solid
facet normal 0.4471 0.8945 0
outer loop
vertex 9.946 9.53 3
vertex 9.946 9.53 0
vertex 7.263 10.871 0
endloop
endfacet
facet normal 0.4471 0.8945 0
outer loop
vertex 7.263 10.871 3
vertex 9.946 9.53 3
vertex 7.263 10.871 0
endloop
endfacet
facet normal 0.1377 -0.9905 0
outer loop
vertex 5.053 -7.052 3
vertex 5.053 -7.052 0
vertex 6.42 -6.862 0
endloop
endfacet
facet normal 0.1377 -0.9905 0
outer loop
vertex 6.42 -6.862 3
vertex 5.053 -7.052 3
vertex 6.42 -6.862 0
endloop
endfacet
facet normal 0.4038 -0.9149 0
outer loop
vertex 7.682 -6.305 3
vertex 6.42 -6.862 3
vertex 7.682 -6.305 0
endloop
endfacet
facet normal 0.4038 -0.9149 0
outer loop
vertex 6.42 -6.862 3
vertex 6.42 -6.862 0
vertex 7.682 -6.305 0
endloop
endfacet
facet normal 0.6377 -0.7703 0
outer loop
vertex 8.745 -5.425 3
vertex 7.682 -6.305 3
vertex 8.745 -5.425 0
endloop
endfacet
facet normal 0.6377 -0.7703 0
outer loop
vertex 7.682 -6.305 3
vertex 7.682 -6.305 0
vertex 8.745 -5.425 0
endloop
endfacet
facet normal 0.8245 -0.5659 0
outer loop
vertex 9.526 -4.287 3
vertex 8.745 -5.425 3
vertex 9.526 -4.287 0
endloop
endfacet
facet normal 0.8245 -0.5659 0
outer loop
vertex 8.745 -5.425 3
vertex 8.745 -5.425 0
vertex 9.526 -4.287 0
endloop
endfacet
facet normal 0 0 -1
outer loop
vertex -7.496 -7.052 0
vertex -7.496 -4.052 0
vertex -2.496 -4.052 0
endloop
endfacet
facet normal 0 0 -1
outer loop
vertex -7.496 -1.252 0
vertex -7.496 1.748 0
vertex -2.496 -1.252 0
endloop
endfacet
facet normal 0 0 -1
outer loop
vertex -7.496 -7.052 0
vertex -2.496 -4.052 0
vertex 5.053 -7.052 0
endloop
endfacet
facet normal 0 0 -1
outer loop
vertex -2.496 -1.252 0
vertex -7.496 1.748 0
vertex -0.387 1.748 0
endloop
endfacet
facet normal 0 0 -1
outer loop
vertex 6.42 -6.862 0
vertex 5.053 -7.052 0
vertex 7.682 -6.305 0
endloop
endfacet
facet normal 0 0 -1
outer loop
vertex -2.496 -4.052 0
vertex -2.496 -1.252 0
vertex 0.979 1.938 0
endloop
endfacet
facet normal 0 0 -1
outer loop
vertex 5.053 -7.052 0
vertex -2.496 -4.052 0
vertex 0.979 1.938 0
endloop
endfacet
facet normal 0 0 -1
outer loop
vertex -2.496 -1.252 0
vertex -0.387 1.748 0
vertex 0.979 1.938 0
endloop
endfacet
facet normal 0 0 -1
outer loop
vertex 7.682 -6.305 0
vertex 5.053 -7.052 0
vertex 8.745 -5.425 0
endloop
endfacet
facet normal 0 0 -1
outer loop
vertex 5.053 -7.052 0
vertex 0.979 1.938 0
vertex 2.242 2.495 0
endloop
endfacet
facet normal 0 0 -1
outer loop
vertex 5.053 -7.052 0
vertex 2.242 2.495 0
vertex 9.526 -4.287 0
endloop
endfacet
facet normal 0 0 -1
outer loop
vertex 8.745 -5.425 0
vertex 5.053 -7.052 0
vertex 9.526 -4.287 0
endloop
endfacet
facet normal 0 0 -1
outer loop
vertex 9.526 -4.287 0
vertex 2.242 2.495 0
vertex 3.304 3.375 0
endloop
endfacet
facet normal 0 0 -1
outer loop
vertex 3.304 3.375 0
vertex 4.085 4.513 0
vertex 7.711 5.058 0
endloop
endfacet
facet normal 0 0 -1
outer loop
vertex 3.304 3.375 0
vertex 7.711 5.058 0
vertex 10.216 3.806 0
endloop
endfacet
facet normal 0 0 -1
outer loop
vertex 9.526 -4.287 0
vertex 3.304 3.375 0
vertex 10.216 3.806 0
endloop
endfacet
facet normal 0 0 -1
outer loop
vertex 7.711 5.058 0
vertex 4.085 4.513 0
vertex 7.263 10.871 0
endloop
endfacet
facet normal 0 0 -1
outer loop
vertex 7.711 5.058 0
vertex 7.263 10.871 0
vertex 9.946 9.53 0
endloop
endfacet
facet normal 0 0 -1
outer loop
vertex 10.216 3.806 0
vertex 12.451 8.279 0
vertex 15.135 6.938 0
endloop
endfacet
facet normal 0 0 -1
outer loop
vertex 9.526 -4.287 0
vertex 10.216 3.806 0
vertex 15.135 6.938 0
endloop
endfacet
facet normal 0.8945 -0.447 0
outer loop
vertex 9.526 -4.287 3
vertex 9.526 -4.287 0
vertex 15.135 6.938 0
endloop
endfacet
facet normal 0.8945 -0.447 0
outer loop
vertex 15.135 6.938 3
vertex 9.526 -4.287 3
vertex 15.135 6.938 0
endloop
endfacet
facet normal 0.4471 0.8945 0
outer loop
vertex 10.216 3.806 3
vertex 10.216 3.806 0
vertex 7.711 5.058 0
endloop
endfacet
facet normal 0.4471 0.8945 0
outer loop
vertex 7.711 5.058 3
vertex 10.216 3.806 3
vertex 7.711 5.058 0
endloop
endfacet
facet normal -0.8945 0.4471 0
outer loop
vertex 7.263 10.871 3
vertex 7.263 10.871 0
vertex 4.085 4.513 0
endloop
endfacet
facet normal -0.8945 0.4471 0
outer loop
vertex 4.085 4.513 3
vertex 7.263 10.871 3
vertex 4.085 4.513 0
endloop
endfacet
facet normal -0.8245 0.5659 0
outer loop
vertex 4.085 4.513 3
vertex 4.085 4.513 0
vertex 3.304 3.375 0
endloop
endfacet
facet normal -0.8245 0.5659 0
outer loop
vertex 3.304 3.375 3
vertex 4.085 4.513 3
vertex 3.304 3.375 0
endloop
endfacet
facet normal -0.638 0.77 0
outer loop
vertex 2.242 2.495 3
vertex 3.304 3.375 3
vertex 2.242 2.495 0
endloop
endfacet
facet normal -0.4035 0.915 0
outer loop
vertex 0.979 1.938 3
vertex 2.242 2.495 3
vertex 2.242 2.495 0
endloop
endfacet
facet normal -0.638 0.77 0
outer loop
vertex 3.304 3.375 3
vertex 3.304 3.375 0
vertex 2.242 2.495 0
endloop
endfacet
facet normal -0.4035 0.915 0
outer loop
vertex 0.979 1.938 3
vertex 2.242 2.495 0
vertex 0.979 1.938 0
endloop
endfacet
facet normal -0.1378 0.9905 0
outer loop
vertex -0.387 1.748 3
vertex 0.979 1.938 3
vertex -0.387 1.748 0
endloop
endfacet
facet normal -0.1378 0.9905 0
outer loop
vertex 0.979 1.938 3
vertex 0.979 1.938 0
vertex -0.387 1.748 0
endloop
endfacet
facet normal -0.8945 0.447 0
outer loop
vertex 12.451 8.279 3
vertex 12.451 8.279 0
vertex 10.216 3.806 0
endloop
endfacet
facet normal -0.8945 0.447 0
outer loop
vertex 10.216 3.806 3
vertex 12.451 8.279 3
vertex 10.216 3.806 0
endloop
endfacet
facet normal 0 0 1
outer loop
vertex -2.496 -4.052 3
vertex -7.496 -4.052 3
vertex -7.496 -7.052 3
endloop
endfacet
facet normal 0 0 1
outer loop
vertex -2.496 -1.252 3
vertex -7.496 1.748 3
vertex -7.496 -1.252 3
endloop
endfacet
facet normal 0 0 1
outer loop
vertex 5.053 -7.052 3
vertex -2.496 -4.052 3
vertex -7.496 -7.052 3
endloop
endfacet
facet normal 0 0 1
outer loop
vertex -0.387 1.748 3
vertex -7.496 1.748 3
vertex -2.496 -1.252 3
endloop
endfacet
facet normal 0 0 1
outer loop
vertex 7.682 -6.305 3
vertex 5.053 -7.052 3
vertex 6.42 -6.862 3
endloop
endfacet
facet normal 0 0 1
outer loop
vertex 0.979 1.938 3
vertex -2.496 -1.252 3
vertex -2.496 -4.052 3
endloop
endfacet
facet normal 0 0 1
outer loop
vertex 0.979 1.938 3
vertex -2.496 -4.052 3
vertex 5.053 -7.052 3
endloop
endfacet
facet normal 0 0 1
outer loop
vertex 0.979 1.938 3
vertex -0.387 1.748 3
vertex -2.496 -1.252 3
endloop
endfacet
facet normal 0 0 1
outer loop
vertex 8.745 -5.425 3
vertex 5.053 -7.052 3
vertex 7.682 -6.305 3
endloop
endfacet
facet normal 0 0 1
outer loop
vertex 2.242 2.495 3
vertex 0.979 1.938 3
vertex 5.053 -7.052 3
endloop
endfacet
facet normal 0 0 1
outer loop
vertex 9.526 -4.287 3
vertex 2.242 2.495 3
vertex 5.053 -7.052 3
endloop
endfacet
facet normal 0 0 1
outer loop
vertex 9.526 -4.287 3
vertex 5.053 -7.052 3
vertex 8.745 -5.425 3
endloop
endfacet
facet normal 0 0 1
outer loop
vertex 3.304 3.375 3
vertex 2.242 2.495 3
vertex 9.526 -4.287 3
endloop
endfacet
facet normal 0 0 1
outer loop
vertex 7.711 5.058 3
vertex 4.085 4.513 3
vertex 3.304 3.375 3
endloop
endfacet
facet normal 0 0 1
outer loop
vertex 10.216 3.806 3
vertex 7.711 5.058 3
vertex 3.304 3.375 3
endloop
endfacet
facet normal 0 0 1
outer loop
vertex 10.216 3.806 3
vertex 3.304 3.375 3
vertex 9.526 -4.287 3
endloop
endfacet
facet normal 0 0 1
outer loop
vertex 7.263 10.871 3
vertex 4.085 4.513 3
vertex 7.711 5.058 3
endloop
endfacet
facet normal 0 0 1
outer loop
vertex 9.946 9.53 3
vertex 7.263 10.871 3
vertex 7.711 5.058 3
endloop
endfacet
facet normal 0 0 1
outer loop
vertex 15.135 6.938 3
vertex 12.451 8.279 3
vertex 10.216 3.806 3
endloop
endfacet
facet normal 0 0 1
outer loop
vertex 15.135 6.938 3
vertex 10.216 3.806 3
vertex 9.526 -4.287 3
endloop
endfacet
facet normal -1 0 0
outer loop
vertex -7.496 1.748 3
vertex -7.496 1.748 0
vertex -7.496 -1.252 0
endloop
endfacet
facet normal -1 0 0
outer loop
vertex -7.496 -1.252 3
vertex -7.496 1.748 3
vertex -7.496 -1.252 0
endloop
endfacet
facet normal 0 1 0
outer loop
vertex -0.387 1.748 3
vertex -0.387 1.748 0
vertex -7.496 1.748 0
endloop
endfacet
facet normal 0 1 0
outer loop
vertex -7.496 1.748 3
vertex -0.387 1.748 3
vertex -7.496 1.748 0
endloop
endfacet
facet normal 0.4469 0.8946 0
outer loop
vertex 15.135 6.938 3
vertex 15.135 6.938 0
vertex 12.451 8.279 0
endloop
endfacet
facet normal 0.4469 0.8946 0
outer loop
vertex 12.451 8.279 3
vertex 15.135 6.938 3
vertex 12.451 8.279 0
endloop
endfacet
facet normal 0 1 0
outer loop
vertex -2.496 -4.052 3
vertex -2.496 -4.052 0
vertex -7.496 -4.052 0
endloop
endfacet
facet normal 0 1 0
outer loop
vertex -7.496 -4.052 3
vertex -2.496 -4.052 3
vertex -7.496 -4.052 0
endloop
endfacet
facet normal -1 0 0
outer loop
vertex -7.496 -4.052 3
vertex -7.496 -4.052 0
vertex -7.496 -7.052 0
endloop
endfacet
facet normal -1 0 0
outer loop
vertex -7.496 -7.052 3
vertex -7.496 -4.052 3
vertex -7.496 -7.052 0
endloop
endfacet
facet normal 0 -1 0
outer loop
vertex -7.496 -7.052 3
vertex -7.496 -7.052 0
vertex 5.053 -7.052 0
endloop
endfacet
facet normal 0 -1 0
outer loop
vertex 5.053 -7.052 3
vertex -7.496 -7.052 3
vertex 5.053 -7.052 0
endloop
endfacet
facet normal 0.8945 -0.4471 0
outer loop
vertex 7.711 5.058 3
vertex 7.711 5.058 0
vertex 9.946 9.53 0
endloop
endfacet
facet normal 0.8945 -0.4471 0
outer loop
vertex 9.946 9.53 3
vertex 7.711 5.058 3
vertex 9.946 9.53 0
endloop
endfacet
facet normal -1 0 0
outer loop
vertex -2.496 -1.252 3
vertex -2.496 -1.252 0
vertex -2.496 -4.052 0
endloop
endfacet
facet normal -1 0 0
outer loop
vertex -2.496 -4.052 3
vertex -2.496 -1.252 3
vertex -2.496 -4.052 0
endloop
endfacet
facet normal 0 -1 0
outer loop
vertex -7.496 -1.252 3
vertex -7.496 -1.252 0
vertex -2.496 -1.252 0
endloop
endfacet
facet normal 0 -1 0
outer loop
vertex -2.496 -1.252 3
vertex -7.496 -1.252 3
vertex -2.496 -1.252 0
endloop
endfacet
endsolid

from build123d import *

# Parameters (mm, degrees)
F1_DEPTH = 3


with BuildPart() as f1:
    # F0 (on Top) → F1 (new body)
    with BuildSketch(Plane.XY):
        with BuildLine():
            Line((-7.495554, -1.252463), (-2.495554, -1.252463))
            Line((-2.495554, -1.252463), (-2.495554, -4.052463))
            Line((-2.495554, -4.052463), (-7.495554, -4.052463))
            Line((-7.495554, -4.052463), (-7.495554, -7.052463))
            Line((-7.495554, -7.052463), (5.053015, -7.052463))
            ThreePointArc((5.053015, -7.052463), (7.682229, -6.305372), (9.525738, -4.287356))
            Line((9.525738, -4.287356), (15.134679, 6.937898))
            Line((15.134679, 6.937898), (12.451045, 8.278834))
            Line((12.451045, 8.278834), (10.216152, 3.806111))
            Line((10.216152, 3.806111), (7.711427, 5.057651))
            Line((7.711427, 5.057651), (9.94632, 9.530374))
            Line((9.94632, 9.530374), (7.262687, 10.87131))
            Line((7.262687, 10.87131), (4.085441, 4.512644))
            ThreePointArc((4.085441, 4.512644), (2.241932, 2.494628), (-0.387282, 1.747537))
            Line((-0.387282, 1.747537), (-7.495554, 1.747537))
            Line((-7.495554, 1.747537), (-7.495554, -1.252463))
        make_face()
    extrude(amount=F1_DEPTH)


solid = f1.part
